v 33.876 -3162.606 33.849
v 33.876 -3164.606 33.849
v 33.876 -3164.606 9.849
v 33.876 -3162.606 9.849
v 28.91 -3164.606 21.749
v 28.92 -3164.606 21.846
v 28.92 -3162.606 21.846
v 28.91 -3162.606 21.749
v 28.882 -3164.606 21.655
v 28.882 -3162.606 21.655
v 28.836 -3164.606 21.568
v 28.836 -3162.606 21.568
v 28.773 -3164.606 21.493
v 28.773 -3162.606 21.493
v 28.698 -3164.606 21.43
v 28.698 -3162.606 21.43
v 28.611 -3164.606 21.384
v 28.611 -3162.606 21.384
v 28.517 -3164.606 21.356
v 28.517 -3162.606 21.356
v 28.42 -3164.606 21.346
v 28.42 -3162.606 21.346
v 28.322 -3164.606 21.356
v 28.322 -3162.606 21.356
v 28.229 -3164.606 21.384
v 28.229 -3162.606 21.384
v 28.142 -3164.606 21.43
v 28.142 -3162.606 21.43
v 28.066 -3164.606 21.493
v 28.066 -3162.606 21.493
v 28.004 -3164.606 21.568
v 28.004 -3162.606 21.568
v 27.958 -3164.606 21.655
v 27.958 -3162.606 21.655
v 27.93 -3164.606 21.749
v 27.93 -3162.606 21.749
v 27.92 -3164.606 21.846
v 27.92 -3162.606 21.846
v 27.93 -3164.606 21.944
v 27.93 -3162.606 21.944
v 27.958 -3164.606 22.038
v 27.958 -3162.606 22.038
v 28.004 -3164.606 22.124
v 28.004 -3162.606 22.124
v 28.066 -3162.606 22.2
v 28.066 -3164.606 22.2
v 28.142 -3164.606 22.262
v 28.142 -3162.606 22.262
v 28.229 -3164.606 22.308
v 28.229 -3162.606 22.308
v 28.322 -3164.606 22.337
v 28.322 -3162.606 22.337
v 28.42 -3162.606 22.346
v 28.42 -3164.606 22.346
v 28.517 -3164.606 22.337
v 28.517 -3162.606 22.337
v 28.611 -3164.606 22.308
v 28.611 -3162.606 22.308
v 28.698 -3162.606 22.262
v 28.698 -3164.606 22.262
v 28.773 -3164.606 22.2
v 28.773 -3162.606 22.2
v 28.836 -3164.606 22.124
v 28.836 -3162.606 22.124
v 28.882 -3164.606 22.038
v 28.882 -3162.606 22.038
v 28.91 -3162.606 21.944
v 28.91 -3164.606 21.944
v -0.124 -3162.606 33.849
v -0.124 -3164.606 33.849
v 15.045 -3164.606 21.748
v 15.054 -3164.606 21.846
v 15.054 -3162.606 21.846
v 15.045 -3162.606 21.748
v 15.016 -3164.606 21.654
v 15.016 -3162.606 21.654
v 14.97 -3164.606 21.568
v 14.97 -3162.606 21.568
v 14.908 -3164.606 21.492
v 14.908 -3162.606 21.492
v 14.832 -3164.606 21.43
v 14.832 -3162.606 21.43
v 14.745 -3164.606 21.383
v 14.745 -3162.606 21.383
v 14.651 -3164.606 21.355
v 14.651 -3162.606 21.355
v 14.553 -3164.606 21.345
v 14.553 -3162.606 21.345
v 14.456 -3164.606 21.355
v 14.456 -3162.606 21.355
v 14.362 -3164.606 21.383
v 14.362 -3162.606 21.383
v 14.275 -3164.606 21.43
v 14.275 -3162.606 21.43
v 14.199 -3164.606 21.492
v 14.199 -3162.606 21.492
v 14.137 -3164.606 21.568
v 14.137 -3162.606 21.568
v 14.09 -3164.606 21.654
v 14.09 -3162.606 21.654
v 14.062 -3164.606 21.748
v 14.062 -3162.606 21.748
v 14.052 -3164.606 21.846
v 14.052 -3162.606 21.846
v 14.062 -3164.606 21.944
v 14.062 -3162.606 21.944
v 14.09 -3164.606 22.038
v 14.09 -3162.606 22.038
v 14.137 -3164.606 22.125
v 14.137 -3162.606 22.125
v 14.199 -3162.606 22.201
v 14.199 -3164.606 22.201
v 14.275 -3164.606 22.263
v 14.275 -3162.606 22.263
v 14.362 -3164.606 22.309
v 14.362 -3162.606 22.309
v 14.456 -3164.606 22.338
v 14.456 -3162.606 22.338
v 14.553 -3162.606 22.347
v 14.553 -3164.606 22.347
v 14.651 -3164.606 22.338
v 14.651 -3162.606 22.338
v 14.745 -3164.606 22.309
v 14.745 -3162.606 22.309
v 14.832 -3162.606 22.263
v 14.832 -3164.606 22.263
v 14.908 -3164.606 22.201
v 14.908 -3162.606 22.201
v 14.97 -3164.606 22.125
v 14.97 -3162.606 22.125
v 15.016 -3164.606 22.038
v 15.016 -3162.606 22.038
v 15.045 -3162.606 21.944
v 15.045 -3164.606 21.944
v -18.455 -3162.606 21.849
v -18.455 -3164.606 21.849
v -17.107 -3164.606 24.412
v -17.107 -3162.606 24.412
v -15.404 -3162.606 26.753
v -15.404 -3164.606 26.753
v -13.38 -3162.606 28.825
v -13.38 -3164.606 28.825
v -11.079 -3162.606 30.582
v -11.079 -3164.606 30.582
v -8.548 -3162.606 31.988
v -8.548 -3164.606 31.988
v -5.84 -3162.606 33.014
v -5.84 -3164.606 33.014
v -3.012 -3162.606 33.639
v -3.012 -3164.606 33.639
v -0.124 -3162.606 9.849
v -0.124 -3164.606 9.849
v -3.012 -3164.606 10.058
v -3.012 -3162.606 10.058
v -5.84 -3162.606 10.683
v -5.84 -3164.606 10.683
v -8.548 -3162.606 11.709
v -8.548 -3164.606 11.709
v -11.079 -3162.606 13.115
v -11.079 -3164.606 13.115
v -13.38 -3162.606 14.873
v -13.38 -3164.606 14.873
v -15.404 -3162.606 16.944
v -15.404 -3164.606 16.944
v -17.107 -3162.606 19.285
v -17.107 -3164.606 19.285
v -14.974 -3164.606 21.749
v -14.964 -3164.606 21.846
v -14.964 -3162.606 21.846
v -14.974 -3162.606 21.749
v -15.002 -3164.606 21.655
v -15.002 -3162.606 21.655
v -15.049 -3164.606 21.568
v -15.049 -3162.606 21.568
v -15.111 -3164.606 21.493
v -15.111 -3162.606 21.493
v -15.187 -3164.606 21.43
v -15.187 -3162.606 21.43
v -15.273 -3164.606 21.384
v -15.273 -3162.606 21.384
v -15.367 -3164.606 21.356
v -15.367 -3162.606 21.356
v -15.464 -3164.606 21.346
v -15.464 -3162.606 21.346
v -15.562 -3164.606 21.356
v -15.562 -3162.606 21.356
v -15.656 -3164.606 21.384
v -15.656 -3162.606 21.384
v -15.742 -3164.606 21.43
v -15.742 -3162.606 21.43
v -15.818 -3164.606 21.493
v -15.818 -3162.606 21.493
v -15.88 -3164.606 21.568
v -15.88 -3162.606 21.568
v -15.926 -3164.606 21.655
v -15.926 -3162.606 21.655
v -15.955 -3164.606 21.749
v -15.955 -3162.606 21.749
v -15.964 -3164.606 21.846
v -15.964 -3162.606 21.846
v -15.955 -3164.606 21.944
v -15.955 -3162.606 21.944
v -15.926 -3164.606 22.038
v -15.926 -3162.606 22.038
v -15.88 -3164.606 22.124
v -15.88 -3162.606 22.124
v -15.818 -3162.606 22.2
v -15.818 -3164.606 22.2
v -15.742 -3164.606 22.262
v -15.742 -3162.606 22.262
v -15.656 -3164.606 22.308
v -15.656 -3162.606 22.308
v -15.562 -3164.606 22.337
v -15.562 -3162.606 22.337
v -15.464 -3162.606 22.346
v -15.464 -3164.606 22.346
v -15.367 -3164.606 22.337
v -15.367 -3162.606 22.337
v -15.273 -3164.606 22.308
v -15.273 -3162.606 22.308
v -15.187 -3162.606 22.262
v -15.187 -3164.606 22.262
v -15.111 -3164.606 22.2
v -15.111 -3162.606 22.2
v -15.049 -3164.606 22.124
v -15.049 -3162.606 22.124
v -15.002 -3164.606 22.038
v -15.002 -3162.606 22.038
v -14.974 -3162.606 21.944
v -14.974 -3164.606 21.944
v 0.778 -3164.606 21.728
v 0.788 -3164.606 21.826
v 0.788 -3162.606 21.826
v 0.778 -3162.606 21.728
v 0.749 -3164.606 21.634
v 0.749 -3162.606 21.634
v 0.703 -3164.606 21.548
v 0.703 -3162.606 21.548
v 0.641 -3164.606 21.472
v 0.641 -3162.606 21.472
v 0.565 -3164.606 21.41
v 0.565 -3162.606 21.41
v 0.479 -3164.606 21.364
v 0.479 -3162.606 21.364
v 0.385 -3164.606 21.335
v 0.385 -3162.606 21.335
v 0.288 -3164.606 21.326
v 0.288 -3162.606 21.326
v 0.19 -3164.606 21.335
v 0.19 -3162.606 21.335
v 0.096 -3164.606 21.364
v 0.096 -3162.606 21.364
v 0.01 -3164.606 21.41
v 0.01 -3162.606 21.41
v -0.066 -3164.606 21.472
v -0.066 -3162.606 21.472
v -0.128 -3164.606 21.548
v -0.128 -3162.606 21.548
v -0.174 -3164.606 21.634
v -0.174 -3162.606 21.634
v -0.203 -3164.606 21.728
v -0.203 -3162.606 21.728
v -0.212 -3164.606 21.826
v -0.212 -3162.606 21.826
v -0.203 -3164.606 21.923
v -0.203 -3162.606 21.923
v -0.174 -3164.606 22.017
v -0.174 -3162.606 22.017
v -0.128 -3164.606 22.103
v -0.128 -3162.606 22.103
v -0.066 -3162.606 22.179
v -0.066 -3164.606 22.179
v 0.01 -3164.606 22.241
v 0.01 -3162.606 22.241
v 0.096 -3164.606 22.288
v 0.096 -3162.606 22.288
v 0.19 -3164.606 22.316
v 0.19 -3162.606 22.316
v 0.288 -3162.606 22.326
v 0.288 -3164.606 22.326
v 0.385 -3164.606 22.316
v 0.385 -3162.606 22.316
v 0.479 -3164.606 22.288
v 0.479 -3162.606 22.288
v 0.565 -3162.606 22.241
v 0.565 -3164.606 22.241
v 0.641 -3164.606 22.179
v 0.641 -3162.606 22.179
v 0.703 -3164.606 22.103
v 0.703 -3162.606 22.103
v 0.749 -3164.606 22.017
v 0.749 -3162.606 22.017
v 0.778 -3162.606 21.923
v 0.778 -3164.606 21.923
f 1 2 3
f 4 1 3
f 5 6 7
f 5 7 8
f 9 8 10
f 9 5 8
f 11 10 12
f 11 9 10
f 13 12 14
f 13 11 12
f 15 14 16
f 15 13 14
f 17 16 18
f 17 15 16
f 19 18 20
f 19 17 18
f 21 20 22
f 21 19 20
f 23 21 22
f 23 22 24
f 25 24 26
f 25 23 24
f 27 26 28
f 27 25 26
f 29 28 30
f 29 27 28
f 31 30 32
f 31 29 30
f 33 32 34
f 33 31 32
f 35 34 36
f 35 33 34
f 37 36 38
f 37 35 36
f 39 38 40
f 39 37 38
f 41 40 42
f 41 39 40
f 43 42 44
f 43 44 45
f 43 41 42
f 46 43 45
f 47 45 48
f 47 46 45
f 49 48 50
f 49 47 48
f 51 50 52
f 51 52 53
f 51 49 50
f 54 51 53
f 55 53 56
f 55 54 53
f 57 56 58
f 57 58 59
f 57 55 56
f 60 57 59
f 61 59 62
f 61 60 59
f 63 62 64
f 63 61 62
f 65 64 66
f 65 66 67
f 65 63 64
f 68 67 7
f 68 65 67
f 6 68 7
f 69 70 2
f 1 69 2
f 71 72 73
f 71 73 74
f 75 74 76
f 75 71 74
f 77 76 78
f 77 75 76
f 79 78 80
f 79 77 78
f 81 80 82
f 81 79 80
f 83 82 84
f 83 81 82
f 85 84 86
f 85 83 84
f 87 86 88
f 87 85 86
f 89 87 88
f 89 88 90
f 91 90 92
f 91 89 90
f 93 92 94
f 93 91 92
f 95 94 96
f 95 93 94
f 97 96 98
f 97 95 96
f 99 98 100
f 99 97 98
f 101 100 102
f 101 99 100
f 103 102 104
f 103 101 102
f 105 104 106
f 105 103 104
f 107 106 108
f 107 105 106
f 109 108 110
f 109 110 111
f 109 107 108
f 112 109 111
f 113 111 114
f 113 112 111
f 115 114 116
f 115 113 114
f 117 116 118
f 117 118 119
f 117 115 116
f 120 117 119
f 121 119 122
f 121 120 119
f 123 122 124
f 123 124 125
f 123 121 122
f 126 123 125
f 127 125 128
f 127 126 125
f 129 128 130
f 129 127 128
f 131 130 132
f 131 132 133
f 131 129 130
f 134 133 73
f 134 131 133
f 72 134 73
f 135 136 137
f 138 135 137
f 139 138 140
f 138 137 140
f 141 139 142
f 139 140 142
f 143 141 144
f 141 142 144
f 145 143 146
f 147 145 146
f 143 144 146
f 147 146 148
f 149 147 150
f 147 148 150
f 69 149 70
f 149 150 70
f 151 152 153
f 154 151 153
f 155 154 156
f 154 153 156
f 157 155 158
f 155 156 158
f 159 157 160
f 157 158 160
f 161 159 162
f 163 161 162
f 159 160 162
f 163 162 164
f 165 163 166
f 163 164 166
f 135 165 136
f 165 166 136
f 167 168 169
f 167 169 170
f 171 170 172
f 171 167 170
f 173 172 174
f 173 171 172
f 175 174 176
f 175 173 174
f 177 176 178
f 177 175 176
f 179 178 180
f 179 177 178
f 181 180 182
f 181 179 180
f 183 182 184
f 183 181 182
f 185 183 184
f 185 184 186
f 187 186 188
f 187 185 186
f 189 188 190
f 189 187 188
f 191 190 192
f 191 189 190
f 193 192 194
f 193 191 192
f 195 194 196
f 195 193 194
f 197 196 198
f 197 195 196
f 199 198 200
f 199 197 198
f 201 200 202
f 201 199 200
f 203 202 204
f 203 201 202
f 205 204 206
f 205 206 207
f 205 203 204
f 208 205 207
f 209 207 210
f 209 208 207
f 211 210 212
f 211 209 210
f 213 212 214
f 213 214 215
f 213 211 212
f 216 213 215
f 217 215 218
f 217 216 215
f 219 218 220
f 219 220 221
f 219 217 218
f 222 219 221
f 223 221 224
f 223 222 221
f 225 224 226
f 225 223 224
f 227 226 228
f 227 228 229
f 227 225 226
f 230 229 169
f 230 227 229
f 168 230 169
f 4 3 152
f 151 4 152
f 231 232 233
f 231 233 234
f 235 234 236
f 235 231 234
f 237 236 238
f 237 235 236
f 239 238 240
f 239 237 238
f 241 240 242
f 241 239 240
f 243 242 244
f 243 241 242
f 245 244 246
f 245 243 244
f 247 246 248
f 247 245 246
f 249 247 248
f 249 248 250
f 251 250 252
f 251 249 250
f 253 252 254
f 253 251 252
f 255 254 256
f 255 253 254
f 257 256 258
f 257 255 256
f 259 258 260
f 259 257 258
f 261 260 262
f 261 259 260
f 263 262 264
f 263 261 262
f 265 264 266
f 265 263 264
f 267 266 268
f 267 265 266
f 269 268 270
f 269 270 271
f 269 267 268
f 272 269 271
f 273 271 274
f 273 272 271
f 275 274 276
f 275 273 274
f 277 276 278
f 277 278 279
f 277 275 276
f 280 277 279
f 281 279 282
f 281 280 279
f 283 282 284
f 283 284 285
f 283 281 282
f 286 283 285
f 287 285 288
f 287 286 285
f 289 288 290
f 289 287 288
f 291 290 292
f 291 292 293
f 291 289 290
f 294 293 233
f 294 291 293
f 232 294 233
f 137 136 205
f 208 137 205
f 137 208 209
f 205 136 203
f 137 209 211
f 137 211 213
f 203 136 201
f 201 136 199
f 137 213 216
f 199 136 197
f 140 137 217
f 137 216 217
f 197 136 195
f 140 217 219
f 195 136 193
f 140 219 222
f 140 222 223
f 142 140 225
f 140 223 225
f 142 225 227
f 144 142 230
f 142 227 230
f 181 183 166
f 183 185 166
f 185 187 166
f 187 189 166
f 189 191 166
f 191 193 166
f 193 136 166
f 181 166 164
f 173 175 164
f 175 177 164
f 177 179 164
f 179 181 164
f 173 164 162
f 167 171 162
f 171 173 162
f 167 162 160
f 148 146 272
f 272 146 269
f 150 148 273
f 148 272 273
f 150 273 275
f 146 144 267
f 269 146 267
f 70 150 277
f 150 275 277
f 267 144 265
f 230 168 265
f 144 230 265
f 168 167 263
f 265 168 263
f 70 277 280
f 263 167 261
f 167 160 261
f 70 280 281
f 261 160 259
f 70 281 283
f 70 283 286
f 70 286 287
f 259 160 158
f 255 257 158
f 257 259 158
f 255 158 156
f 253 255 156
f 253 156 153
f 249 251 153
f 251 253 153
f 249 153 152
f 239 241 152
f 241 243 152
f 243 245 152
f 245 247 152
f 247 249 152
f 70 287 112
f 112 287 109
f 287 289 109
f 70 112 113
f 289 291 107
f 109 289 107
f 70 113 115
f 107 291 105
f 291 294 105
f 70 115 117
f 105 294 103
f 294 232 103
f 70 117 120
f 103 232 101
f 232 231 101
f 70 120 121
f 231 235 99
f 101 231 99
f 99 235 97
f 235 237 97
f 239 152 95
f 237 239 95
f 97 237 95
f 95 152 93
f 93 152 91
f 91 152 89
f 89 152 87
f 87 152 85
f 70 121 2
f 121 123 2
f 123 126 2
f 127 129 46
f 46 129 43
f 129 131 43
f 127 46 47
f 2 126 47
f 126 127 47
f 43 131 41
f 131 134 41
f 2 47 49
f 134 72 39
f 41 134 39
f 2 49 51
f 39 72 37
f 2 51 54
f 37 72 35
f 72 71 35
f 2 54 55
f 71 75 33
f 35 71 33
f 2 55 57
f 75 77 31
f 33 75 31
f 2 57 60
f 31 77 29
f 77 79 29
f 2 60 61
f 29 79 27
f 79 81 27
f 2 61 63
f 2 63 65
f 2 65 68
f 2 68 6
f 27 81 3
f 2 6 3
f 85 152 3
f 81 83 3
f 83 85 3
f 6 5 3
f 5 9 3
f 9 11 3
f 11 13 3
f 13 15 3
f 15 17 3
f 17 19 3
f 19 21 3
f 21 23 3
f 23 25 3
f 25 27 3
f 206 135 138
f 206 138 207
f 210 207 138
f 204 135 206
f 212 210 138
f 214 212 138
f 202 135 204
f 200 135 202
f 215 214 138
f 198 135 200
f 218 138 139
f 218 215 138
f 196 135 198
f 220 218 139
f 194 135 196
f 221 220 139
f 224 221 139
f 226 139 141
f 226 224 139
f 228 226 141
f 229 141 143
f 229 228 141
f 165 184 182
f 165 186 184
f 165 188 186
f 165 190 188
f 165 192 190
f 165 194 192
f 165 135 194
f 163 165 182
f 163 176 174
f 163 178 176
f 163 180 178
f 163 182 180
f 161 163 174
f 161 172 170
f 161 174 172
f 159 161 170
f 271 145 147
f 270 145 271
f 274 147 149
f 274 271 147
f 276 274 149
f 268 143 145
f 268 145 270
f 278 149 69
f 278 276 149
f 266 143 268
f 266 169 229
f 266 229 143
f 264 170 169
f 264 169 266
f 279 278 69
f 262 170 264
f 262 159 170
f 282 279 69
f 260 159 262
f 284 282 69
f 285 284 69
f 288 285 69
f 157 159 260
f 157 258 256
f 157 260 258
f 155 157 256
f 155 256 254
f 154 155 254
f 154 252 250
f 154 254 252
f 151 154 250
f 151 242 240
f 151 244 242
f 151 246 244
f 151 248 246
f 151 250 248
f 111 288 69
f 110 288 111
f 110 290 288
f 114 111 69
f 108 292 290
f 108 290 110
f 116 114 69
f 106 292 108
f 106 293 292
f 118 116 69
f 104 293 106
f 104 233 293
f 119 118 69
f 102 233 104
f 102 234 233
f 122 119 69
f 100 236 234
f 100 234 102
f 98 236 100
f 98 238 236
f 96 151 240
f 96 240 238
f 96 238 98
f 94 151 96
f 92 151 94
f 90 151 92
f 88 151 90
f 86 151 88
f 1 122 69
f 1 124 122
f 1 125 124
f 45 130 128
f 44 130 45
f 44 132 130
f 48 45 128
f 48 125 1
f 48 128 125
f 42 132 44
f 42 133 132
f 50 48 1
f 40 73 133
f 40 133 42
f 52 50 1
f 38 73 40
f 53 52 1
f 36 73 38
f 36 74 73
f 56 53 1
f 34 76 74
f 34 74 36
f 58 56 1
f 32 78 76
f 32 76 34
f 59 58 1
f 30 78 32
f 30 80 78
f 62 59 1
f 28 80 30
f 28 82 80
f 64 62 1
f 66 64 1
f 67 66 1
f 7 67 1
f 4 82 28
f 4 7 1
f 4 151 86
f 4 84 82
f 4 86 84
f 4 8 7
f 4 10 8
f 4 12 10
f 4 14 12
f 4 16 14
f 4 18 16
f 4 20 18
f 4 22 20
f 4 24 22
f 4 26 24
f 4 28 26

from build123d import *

# Parameters (mm, degrees)
SKETCH1_R           = 0.5
SKETCH1_R_2         = 0.501124618
BOSS_EXTRUDE1_DEPTH = 2


with BuildPart() as part:
    # Sketch1 → Boss-Extrude1 (new body)
    with BuildSketch(Plane(origin=(3.665299607, -3164.606366481, 1.228377955), x_dir=(1, 0, 0), z_dir=(0, 1, 0))):
        with BuildLine():
            Line((28.210288662, -32.620192101), (30.210288662, -32.620192101))
            Line((30.210288662, -32.620192101), (30.210288662, -8.620192101))
            Line((30.210288662, -8.620192101), (28.210288662, -8.620192101))
            Line((28.210288662, -8.620192101), (-3.789711338, -8.620192101))
            ThreePointArc((-3.789711338, -8.620192101), (-14.744162488, -11.88699157), (-22.120014118, -20.620192101))
            ThreePointArc((-22.120014118, -20.620192101), (-14.744162488, -29.353392632), (-3.789711338, -32.620192101))
            Line((-3.789711338, -32.620192101), (28.210288662, -32.620192101))
        make_face()
        with Locations((-19.129616691, -20.617828064)):
            Circle(SKETCH1_R, mode=Mode.SUBTRACT)
        with Locations((24.75459638, -20.617828064)):
            Circle(SKETCH1_R, mode=Mode.SUBTRACT)
        with Locations((10.8879759, -20.617828064)):
            Circle(SKETCH1_R_2, mode=Mode.SUBTRACT)
        with Locations((-3.377772721, -20.597275642)):
            Circle(SKETCH1_R, mode=Mode.SUBTRACT)
    extrude(amount=BOSS_EXTRUDE1_DEPTH)


solid = part.part
